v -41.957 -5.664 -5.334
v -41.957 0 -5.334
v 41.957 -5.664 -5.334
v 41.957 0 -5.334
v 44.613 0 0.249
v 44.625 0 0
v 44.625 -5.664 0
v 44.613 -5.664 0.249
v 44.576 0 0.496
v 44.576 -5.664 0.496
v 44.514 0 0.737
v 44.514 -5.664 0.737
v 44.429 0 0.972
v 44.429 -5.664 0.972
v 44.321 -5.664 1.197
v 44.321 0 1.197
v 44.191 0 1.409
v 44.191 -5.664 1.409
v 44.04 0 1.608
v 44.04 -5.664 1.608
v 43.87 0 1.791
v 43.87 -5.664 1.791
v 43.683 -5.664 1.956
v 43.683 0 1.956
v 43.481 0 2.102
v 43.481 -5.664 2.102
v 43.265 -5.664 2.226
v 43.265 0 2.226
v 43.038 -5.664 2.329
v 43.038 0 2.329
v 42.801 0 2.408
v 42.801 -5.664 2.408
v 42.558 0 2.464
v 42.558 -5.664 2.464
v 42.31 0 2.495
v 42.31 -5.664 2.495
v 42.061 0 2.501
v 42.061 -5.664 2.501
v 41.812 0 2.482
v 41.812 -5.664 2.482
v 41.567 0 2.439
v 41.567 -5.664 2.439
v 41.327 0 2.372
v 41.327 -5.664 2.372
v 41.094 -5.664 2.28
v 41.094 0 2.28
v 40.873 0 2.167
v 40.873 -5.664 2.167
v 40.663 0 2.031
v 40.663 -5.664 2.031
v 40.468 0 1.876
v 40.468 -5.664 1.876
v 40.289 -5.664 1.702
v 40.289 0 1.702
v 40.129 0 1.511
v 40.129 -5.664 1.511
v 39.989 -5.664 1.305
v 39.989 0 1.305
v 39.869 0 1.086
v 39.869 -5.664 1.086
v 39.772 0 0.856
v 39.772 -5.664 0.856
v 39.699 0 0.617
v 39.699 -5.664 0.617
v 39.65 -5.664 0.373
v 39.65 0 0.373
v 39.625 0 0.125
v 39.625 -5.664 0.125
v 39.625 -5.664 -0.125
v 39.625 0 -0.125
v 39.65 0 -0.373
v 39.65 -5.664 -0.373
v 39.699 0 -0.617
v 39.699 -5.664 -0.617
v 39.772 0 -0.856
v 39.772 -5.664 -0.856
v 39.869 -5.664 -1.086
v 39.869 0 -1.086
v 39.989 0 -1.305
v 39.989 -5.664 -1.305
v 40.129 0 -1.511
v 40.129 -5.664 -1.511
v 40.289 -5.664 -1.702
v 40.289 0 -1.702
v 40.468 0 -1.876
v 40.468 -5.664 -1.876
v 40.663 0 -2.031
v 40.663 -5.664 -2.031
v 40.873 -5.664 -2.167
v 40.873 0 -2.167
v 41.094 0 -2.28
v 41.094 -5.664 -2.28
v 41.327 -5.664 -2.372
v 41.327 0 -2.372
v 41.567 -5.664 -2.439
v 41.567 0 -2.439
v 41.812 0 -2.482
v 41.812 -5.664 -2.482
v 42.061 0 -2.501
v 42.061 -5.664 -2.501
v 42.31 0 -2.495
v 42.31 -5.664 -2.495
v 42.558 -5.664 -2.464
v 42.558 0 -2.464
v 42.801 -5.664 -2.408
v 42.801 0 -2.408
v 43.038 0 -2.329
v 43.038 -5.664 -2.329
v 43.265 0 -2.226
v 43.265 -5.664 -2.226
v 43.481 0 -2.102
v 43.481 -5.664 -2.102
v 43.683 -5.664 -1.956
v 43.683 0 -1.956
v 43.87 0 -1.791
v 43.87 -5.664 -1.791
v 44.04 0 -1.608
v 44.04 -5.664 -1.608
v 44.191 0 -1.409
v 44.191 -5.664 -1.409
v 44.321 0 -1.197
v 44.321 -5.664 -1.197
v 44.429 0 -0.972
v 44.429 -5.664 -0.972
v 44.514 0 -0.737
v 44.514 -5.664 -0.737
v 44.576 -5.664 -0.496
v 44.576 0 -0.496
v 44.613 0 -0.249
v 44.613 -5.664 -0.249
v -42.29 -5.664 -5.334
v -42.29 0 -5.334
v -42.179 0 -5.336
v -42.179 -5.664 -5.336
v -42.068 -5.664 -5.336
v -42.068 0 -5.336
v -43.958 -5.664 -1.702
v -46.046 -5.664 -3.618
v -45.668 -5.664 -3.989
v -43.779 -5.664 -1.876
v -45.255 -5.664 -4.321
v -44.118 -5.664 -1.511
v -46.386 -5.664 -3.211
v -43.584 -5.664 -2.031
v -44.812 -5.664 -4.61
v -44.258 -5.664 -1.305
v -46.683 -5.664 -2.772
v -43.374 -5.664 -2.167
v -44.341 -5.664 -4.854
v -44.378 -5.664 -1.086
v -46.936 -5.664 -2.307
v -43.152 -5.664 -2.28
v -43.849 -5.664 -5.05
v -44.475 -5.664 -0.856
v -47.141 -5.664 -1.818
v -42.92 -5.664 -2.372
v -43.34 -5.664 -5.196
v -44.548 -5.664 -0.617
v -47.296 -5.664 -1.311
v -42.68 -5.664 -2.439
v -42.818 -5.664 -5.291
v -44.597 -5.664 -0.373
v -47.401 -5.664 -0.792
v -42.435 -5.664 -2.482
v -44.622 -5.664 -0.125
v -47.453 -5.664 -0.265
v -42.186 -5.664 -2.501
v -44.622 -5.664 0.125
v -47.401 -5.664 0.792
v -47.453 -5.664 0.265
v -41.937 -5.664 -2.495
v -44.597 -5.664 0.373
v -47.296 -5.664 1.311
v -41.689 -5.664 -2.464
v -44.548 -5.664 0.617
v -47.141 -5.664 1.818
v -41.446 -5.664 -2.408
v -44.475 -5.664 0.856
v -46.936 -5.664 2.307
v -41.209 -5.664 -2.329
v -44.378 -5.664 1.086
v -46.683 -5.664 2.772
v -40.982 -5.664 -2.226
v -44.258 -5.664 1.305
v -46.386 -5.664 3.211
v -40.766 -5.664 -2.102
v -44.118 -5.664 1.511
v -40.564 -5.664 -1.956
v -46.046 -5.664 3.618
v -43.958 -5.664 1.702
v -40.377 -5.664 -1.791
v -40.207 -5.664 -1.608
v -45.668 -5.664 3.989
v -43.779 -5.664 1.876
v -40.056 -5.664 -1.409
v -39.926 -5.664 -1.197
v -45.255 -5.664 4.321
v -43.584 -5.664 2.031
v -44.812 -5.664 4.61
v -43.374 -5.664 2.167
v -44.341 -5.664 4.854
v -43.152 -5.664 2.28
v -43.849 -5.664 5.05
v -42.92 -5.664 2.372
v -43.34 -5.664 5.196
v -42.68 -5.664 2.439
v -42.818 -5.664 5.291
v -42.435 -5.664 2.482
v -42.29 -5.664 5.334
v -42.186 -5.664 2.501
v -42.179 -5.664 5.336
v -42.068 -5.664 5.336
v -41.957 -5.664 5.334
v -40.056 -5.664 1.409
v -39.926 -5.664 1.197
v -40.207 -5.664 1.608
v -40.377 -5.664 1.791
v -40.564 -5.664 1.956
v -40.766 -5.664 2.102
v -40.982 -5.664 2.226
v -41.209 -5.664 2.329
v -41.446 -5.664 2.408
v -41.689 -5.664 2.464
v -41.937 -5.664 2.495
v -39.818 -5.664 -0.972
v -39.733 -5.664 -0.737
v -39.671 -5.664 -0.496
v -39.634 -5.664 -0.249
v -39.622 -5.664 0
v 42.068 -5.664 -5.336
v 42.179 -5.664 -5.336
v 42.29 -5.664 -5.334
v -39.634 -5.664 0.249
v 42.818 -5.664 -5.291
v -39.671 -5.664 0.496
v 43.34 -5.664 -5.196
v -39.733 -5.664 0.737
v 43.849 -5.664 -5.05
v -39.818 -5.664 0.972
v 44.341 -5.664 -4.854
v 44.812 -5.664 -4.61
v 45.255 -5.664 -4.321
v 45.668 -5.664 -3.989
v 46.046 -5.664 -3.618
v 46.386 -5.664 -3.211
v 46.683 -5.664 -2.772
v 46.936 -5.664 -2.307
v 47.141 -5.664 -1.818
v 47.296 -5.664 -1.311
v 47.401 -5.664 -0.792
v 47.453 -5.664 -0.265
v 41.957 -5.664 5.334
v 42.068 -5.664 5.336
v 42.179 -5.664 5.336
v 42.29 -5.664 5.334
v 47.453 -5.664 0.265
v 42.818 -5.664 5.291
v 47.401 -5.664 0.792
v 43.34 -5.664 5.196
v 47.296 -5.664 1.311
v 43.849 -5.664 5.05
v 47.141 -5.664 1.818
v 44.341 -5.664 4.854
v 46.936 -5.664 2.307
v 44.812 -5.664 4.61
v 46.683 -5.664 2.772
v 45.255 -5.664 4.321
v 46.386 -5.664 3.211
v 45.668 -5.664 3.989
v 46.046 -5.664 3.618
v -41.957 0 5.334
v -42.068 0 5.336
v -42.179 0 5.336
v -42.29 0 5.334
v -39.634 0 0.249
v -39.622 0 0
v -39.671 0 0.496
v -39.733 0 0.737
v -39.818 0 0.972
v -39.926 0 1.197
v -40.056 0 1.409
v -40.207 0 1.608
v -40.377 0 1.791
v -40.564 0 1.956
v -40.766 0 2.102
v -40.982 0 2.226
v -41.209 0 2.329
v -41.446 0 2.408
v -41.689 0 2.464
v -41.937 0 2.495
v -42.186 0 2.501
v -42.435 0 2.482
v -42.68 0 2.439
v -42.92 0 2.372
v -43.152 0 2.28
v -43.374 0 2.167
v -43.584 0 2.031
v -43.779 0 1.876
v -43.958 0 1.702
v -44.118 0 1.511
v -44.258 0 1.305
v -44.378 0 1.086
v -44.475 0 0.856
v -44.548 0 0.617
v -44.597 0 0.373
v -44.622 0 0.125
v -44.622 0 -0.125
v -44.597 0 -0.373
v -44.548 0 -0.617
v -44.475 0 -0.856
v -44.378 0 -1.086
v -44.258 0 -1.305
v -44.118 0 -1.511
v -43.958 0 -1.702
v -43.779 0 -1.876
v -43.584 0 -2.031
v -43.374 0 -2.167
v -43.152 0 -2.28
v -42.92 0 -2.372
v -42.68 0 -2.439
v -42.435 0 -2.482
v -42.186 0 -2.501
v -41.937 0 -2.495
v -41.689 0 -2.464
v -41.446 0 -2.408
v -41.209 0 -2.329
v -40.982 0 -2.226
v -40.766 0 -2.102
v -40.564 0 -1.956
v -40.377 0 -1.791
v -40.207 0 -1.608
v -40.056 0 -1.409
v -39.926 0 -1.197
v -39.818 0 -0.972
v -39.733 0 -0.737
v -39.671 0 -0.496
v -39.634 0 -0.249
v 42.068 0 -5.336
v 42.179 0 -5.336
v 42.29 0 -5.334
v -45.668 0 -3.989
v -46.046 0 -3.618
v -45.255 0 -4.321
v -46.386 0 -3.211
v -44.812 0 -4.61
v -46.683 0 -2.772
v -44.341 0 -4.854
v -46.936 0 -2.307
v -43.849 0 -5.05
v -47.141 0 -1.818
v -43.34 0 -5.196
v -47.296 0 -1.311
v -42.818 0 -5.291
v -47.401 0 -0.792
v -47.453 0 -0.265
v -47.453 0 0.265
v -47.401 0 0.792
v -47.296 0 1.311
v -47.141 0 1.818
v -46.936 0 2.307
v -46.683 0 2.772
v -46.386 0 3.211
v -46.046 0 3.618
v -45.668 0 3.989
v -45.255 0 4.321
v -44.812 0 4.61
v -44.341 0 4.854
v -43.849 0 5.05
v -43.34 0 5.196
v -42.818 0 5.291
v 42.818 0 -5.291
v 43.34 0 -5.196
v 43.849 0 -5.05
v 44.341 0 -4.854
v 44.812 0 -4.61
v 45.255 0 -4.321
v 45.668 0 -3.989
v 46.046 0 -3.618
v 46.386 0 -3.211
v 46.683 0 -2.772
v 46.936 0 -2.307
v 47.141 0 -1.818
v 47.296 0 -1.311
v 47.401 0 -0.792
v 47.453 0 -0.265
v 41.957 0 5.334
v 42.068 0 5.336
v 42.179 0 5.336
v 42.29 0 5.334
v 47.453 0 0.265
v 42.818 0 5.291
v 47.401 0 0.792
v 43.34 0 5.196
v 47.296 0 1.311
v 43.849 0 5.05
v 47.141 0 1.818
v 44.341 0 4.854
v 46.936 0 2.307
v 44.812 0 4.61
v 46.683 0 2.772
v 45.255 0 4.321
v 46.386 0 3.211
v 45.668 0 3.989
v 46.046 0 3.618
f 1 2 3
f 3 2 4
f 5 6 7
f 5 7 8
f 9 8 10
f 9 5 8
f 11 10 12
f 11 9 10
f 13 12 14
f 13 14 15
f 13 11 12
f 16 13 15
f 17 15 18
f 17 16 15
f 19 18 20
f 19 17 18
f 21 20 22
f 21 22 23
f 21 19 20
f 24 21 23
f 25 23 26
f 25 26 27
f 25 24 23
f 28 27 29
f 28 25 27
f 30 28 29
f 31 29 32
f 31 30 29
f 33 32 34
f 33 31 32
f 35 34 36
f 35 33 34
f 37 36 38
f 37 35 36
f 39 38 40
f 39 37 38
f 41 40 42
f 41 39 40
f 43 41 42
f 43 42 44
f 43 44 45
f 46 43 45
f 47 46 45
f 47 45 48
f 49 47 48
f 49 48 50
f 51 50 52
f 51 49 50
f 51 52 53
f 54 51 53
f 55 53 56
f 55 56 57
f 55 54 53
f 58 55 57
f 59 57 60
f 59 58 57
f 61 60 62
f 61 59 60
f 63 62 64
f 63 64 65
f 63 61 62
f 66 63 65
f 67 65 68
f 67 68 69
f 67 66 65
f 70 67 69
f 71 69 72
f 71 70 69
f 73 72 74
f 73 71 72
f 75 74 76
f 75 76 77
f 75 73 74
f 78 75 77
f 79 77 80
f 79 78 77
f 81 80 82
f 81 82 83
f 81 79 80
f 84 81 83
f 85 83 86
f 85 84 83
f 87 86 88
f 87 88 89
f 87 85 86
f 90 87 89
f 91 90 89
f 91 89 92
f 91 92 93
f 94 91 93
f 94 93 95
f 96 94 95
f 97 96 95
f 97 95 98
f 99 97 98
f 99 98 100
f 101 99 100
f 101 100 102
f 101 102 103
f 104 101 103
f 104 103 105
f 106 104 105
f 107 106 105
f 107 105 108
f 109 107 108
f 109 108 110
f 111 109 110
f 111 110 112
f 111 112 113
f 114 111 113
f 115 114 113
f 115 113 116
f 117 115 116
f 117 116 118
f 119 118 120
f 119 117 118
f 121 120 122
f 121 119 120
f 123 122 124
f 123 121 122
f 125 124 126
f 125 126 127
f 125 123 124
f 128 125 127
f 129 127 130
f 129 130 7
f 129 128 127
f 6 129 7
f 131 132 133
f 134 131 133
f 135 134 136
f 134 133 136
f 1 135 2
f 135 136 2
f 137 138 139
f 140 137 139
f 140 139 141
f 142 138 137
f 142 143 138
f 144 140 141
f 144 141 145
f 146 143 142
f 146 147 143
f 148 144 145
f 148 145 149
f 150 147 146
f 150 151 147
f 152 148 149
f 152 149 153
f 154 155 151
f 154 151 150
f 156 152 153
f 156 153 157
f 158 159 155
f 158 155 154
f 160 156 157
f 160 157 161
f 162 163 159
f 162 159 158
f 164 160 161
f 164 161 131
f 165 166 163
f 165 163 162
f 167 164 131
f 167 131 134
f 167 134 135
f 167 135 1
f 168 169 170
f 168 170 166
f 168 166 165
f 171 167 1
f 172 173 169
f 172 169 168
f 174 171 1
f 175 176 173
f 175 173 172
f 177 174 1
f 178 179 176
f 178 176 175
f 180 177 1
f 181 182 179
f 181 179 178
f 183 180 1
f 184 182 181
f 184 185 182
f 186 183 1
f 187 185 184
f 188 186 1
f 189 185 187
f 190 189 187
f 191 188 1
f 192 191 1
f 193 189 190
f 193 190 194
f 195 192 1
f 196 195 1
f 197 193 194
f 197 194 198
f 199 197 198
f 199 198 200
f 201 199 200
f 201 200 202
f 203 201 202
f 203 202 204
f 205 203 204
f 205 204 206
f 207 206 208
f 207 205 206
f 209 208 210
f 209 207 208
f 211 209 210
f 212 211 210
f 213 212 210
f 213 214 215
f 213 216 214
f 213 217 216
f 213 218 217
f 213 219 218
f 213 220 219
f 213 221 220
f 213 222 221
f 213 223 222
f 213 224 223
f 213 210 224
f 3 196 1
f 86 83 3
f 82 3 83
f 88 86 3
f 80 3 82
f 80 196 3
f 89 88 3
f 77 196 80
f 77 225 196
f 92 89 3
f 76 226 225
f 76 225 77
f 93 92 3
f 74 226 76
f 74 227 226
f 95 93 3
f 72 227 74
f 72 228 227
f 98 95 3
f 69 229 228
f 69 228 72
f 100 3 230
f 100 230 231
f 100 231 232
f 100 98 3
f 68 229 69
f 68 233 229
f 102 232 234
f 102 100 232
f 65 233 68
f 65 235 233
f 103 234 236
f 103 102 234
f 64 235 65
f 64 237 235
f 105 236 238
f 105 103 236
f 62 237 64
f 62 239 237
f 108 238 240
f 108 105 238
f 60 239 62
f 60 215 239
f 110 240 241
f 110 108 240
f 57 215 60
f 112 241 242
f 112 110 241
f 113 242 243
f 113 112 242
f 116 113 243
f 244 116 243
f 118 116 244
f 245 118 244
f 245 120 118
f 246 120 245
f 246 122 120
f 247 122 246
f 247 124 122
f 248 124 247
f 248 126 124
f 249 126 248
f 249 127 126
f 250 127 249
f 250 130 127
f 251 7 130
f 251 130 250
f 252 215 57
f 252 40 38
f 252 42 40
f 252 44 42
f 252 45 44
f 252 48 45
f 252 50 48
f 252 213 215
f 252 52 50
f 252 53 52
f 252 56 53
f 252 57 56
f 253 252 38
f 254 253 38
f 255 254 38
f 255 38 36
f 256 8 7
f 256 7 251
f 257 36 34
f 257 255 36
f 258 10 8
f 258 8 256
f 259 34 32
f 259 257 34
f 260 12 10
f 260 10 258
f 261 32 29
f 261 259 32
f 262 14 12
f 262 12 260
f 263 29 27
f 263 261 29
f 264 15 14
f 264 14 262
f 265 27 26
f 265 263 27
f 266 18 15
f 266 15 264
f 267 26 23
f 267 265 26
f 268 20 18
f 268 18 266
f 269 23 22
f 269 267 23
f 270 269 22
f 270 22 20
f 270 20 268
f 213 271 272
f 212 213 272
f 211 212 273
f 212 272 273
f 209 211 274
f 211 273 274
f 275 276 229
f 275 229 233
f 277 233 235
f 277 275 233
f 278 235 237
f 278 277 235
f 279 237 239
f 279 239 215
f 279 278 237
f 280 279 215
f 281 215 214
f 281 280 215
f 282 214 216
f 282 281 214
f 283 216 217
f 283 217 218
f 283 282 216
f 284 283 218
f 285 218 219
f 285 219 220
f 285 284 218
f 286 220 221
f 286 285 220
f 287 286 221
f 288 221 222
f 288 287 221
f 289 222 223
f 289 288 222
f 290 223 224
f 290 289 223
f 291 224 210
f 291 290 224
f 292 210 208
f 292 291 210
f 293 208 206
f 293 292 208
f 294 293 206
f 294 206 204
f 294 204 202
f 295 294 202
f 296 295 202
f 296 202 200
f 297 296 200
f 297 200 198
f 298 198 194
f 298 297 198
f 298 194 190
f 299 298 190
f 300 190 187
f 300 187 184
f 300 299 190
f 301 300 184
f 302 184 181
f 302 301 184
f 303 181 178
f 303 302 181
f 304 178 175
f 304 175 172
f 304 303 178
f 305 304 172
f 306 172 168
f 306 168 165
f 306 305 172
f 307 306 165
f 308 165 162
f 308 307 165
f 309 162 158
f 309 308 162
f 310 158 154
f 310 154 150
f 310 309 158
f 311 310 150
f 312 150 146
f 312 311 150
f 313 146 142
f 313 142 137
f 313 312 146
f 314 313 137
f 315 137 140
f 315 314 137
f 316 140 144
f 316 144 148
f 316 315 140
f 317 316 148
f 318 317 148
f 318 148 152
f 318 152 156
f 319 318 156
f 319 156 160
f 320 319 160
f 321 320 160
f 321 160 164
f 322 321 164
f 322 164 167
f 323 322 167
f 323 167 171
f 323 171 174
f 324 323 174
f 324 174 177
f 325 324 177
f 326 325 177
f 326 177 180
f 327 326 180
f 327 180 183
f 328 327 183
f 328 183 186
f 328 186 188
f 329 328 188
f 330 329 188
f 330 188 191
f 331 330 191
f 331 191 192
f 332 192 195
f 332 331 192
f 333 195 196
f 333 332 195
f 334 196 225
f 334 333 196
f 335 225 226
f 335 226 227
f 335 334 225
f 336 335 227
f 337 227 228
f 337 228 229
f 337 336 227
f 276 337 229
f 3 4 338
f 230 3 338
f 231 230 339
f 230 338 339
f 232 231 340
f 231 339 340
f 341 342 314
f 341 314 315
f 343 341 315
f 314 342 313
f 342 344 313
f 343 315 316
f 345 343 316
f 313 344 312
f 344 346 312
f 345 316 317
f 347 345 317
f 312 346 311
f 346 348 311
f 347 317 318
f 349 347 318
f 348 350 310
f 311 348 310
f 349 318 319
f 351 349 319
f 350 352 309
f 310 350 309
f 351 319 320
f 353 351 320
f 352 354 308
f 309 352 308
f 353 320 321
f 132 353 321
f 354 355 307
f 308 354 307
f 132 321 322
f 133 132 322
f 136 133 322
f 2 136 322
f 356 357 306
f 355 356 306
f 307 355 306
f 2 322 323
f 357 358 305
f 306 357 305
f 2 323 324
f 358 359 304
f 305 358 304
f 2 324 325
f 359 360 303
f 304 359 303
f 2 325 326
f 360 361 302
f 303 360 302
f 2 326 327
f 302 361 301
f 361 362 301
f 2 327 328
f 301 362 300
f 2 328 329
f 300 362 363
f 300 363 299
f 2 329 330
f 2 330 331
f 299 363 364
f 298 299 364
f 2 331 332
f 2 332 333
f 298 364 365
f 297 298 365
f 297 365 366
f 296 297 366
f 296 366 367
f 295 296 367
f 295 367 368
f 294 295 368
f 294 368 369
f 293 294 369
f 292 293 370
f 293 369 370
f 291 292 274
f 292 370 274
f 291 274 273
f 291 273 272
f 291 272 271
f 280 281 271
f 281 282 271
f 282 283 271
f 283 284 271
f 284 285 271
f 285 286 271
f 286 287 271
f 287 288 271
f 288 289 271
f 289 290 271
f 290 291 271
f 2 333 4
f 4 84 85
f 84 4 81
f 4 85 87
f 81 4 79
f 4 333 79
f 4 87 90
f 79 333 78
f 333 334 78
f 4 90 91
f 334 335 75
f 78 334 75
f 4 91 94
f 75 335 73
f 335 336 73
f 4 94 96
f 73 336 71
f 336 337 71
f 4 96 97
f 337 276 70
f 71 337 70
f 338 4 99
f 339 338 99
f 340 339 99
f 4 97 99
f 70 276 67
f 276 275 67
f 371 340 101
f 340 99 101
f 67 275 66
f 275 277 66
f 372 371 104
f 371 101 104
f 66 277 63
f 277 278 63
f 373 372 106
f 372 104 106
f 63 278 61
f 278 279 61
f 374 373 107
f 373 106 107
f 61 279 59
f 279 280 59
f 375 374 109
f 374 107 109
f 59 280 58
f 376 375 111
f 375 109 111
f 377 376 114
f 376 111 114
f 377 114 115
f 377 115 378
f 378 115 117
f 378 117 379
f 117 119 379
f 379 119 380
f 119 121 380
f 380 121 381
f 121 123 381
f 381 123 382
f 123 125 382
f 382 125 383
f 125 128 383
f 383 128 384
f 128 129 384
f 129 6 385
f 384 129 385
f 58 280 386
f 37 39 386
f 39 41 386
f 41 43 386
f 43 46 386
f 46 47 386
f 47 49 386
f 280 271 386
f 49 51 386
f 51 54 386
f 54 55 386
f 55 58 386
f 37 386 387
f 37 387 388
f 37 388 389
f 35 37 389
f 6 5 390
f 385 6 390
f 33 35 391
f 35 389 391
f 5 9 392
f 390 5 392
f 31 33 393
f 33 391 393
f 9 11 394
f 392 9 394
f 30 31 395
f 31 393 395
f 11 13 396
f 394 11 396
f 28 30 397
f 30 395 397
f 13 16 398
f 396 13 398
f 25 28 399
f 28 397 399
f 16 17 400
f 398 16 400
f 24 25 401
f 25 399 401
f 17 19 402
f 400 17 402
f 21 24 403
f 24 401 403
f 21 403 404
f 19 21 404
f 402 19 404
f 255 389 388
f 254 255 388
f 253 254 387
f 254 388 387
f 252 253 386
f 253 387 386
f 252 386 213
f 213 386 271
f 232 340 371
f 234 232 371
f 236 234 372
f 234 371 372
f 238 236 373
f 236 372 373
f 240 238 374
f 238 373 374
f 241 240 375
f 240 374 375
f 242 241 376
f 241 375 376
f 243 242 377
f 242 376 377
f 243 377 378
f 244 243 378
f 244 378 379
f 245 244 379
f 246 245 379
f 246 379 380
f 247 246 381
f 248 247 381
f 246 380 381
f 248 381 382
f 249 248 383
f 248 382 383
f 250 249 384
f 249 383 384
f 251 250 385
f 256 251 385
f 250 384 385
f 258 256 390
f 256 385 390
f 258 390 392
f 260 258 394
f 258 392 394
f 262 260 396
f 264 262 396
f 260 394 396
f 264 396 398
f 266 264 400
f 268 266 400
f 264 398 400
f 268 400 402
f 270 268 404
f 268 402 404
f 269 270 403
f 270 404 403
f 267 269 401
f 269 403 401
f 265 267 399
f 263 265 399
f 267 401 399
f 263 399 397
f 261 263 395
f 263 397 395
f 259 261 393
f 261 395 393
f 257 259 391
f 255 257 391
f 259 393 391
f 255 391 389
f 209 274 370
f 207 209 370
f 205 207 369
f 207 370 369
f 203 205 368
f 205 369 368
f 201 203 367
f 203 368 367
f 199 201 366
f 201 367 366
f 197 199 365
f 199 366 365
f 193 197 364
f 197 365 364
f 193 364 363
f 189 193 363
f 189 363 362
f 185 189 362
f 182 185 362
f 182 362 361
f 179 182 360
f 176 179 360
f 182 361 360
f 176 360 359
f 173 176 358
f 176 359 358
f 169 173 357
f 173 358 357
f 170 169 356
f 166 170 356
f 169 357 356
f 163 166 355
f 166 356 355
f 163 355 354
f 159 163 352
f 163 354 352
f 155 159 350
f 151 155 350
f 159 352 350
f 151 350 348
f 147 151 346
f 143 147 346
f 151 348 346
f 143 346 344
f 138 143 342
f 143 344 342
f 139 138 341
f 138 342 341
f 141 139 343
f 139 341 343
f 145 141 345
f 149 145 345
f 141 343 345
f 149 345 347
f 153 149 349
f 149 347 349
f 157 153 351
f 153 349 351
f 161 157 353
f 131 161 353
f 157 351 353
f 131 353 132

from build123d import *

# Parameters (mm, degrees)
F0_R     = 2.5019
F1_DEPTH = 5.6642


with BuildPart() as f1:
    # F0 (on Front) → F1 (new body)
    with BuildSketch(Plane.XZ):
        with BuildLine():
            ThreePointArc((41.956571, -5.333796), (42.123493, -5.336407), (42.290415, -5.333796))
            Line((42.290415, -5.333796), (41.956571, -5.333796))
        make_face()
        with BuildLine():
            Line((41.956571, -5.333796), (42.290415, -5.333796))
            ThreePointArc((42.290415, -5.333796), (47.4599, 0), (42.290415, 5.333796))
            Line((42.290415, 5.333796), (41.956571, 5.333796))
            Line((41.956571, 5.333796), (-41.956571, 5.333796))
            Line((-41.956571, 5.333796), (-42.290415, 5.333796))
            ThreePointArc((-42.290415, 5.333796), (-47.4599, 0), (-42.290415, -5.333796))
            Line((-42.290415, -5.333796), (-41.956571, -5.333796))
            Line((-41.956571, -5.333796), (41.956571, -5.333796))
        make_face()
        with Locations((-42.123493, 0)):
            Circle(F0_R, mode=Mode.SUBTRACT)
        with Locations((42.123493, 0)):
            Circle(F0_R, mode=Mode.SUBTRACT)
        with BuildLine():
            Line((41.956571, 5.333796), (42.290415, 5.333796))
            ThreePointArc((42.290415, 5.333796), (42.123493, 5.336407), (41.956571, 5.333796))
        make_face()
        with BuildLine():
            ThreePointArc((-42.290415, -5.333796), (-42.123493, -5.336407), (-41.956571, -5.333796))
            Line((-41.956571, -5.333796), (-42.290415, -5.333796))
        make_face()
        with BuildLine():
            Line((-42.290415, 5.333796), (-41.956571, 5.333796))
            ThreePointArc((-41.956571, 5.333796), (-42.123493, 5.336407), (-42.290415, 5.333796))
        make_face()
    extrude(amount=F1_DEPTH)


solid = f1.part
